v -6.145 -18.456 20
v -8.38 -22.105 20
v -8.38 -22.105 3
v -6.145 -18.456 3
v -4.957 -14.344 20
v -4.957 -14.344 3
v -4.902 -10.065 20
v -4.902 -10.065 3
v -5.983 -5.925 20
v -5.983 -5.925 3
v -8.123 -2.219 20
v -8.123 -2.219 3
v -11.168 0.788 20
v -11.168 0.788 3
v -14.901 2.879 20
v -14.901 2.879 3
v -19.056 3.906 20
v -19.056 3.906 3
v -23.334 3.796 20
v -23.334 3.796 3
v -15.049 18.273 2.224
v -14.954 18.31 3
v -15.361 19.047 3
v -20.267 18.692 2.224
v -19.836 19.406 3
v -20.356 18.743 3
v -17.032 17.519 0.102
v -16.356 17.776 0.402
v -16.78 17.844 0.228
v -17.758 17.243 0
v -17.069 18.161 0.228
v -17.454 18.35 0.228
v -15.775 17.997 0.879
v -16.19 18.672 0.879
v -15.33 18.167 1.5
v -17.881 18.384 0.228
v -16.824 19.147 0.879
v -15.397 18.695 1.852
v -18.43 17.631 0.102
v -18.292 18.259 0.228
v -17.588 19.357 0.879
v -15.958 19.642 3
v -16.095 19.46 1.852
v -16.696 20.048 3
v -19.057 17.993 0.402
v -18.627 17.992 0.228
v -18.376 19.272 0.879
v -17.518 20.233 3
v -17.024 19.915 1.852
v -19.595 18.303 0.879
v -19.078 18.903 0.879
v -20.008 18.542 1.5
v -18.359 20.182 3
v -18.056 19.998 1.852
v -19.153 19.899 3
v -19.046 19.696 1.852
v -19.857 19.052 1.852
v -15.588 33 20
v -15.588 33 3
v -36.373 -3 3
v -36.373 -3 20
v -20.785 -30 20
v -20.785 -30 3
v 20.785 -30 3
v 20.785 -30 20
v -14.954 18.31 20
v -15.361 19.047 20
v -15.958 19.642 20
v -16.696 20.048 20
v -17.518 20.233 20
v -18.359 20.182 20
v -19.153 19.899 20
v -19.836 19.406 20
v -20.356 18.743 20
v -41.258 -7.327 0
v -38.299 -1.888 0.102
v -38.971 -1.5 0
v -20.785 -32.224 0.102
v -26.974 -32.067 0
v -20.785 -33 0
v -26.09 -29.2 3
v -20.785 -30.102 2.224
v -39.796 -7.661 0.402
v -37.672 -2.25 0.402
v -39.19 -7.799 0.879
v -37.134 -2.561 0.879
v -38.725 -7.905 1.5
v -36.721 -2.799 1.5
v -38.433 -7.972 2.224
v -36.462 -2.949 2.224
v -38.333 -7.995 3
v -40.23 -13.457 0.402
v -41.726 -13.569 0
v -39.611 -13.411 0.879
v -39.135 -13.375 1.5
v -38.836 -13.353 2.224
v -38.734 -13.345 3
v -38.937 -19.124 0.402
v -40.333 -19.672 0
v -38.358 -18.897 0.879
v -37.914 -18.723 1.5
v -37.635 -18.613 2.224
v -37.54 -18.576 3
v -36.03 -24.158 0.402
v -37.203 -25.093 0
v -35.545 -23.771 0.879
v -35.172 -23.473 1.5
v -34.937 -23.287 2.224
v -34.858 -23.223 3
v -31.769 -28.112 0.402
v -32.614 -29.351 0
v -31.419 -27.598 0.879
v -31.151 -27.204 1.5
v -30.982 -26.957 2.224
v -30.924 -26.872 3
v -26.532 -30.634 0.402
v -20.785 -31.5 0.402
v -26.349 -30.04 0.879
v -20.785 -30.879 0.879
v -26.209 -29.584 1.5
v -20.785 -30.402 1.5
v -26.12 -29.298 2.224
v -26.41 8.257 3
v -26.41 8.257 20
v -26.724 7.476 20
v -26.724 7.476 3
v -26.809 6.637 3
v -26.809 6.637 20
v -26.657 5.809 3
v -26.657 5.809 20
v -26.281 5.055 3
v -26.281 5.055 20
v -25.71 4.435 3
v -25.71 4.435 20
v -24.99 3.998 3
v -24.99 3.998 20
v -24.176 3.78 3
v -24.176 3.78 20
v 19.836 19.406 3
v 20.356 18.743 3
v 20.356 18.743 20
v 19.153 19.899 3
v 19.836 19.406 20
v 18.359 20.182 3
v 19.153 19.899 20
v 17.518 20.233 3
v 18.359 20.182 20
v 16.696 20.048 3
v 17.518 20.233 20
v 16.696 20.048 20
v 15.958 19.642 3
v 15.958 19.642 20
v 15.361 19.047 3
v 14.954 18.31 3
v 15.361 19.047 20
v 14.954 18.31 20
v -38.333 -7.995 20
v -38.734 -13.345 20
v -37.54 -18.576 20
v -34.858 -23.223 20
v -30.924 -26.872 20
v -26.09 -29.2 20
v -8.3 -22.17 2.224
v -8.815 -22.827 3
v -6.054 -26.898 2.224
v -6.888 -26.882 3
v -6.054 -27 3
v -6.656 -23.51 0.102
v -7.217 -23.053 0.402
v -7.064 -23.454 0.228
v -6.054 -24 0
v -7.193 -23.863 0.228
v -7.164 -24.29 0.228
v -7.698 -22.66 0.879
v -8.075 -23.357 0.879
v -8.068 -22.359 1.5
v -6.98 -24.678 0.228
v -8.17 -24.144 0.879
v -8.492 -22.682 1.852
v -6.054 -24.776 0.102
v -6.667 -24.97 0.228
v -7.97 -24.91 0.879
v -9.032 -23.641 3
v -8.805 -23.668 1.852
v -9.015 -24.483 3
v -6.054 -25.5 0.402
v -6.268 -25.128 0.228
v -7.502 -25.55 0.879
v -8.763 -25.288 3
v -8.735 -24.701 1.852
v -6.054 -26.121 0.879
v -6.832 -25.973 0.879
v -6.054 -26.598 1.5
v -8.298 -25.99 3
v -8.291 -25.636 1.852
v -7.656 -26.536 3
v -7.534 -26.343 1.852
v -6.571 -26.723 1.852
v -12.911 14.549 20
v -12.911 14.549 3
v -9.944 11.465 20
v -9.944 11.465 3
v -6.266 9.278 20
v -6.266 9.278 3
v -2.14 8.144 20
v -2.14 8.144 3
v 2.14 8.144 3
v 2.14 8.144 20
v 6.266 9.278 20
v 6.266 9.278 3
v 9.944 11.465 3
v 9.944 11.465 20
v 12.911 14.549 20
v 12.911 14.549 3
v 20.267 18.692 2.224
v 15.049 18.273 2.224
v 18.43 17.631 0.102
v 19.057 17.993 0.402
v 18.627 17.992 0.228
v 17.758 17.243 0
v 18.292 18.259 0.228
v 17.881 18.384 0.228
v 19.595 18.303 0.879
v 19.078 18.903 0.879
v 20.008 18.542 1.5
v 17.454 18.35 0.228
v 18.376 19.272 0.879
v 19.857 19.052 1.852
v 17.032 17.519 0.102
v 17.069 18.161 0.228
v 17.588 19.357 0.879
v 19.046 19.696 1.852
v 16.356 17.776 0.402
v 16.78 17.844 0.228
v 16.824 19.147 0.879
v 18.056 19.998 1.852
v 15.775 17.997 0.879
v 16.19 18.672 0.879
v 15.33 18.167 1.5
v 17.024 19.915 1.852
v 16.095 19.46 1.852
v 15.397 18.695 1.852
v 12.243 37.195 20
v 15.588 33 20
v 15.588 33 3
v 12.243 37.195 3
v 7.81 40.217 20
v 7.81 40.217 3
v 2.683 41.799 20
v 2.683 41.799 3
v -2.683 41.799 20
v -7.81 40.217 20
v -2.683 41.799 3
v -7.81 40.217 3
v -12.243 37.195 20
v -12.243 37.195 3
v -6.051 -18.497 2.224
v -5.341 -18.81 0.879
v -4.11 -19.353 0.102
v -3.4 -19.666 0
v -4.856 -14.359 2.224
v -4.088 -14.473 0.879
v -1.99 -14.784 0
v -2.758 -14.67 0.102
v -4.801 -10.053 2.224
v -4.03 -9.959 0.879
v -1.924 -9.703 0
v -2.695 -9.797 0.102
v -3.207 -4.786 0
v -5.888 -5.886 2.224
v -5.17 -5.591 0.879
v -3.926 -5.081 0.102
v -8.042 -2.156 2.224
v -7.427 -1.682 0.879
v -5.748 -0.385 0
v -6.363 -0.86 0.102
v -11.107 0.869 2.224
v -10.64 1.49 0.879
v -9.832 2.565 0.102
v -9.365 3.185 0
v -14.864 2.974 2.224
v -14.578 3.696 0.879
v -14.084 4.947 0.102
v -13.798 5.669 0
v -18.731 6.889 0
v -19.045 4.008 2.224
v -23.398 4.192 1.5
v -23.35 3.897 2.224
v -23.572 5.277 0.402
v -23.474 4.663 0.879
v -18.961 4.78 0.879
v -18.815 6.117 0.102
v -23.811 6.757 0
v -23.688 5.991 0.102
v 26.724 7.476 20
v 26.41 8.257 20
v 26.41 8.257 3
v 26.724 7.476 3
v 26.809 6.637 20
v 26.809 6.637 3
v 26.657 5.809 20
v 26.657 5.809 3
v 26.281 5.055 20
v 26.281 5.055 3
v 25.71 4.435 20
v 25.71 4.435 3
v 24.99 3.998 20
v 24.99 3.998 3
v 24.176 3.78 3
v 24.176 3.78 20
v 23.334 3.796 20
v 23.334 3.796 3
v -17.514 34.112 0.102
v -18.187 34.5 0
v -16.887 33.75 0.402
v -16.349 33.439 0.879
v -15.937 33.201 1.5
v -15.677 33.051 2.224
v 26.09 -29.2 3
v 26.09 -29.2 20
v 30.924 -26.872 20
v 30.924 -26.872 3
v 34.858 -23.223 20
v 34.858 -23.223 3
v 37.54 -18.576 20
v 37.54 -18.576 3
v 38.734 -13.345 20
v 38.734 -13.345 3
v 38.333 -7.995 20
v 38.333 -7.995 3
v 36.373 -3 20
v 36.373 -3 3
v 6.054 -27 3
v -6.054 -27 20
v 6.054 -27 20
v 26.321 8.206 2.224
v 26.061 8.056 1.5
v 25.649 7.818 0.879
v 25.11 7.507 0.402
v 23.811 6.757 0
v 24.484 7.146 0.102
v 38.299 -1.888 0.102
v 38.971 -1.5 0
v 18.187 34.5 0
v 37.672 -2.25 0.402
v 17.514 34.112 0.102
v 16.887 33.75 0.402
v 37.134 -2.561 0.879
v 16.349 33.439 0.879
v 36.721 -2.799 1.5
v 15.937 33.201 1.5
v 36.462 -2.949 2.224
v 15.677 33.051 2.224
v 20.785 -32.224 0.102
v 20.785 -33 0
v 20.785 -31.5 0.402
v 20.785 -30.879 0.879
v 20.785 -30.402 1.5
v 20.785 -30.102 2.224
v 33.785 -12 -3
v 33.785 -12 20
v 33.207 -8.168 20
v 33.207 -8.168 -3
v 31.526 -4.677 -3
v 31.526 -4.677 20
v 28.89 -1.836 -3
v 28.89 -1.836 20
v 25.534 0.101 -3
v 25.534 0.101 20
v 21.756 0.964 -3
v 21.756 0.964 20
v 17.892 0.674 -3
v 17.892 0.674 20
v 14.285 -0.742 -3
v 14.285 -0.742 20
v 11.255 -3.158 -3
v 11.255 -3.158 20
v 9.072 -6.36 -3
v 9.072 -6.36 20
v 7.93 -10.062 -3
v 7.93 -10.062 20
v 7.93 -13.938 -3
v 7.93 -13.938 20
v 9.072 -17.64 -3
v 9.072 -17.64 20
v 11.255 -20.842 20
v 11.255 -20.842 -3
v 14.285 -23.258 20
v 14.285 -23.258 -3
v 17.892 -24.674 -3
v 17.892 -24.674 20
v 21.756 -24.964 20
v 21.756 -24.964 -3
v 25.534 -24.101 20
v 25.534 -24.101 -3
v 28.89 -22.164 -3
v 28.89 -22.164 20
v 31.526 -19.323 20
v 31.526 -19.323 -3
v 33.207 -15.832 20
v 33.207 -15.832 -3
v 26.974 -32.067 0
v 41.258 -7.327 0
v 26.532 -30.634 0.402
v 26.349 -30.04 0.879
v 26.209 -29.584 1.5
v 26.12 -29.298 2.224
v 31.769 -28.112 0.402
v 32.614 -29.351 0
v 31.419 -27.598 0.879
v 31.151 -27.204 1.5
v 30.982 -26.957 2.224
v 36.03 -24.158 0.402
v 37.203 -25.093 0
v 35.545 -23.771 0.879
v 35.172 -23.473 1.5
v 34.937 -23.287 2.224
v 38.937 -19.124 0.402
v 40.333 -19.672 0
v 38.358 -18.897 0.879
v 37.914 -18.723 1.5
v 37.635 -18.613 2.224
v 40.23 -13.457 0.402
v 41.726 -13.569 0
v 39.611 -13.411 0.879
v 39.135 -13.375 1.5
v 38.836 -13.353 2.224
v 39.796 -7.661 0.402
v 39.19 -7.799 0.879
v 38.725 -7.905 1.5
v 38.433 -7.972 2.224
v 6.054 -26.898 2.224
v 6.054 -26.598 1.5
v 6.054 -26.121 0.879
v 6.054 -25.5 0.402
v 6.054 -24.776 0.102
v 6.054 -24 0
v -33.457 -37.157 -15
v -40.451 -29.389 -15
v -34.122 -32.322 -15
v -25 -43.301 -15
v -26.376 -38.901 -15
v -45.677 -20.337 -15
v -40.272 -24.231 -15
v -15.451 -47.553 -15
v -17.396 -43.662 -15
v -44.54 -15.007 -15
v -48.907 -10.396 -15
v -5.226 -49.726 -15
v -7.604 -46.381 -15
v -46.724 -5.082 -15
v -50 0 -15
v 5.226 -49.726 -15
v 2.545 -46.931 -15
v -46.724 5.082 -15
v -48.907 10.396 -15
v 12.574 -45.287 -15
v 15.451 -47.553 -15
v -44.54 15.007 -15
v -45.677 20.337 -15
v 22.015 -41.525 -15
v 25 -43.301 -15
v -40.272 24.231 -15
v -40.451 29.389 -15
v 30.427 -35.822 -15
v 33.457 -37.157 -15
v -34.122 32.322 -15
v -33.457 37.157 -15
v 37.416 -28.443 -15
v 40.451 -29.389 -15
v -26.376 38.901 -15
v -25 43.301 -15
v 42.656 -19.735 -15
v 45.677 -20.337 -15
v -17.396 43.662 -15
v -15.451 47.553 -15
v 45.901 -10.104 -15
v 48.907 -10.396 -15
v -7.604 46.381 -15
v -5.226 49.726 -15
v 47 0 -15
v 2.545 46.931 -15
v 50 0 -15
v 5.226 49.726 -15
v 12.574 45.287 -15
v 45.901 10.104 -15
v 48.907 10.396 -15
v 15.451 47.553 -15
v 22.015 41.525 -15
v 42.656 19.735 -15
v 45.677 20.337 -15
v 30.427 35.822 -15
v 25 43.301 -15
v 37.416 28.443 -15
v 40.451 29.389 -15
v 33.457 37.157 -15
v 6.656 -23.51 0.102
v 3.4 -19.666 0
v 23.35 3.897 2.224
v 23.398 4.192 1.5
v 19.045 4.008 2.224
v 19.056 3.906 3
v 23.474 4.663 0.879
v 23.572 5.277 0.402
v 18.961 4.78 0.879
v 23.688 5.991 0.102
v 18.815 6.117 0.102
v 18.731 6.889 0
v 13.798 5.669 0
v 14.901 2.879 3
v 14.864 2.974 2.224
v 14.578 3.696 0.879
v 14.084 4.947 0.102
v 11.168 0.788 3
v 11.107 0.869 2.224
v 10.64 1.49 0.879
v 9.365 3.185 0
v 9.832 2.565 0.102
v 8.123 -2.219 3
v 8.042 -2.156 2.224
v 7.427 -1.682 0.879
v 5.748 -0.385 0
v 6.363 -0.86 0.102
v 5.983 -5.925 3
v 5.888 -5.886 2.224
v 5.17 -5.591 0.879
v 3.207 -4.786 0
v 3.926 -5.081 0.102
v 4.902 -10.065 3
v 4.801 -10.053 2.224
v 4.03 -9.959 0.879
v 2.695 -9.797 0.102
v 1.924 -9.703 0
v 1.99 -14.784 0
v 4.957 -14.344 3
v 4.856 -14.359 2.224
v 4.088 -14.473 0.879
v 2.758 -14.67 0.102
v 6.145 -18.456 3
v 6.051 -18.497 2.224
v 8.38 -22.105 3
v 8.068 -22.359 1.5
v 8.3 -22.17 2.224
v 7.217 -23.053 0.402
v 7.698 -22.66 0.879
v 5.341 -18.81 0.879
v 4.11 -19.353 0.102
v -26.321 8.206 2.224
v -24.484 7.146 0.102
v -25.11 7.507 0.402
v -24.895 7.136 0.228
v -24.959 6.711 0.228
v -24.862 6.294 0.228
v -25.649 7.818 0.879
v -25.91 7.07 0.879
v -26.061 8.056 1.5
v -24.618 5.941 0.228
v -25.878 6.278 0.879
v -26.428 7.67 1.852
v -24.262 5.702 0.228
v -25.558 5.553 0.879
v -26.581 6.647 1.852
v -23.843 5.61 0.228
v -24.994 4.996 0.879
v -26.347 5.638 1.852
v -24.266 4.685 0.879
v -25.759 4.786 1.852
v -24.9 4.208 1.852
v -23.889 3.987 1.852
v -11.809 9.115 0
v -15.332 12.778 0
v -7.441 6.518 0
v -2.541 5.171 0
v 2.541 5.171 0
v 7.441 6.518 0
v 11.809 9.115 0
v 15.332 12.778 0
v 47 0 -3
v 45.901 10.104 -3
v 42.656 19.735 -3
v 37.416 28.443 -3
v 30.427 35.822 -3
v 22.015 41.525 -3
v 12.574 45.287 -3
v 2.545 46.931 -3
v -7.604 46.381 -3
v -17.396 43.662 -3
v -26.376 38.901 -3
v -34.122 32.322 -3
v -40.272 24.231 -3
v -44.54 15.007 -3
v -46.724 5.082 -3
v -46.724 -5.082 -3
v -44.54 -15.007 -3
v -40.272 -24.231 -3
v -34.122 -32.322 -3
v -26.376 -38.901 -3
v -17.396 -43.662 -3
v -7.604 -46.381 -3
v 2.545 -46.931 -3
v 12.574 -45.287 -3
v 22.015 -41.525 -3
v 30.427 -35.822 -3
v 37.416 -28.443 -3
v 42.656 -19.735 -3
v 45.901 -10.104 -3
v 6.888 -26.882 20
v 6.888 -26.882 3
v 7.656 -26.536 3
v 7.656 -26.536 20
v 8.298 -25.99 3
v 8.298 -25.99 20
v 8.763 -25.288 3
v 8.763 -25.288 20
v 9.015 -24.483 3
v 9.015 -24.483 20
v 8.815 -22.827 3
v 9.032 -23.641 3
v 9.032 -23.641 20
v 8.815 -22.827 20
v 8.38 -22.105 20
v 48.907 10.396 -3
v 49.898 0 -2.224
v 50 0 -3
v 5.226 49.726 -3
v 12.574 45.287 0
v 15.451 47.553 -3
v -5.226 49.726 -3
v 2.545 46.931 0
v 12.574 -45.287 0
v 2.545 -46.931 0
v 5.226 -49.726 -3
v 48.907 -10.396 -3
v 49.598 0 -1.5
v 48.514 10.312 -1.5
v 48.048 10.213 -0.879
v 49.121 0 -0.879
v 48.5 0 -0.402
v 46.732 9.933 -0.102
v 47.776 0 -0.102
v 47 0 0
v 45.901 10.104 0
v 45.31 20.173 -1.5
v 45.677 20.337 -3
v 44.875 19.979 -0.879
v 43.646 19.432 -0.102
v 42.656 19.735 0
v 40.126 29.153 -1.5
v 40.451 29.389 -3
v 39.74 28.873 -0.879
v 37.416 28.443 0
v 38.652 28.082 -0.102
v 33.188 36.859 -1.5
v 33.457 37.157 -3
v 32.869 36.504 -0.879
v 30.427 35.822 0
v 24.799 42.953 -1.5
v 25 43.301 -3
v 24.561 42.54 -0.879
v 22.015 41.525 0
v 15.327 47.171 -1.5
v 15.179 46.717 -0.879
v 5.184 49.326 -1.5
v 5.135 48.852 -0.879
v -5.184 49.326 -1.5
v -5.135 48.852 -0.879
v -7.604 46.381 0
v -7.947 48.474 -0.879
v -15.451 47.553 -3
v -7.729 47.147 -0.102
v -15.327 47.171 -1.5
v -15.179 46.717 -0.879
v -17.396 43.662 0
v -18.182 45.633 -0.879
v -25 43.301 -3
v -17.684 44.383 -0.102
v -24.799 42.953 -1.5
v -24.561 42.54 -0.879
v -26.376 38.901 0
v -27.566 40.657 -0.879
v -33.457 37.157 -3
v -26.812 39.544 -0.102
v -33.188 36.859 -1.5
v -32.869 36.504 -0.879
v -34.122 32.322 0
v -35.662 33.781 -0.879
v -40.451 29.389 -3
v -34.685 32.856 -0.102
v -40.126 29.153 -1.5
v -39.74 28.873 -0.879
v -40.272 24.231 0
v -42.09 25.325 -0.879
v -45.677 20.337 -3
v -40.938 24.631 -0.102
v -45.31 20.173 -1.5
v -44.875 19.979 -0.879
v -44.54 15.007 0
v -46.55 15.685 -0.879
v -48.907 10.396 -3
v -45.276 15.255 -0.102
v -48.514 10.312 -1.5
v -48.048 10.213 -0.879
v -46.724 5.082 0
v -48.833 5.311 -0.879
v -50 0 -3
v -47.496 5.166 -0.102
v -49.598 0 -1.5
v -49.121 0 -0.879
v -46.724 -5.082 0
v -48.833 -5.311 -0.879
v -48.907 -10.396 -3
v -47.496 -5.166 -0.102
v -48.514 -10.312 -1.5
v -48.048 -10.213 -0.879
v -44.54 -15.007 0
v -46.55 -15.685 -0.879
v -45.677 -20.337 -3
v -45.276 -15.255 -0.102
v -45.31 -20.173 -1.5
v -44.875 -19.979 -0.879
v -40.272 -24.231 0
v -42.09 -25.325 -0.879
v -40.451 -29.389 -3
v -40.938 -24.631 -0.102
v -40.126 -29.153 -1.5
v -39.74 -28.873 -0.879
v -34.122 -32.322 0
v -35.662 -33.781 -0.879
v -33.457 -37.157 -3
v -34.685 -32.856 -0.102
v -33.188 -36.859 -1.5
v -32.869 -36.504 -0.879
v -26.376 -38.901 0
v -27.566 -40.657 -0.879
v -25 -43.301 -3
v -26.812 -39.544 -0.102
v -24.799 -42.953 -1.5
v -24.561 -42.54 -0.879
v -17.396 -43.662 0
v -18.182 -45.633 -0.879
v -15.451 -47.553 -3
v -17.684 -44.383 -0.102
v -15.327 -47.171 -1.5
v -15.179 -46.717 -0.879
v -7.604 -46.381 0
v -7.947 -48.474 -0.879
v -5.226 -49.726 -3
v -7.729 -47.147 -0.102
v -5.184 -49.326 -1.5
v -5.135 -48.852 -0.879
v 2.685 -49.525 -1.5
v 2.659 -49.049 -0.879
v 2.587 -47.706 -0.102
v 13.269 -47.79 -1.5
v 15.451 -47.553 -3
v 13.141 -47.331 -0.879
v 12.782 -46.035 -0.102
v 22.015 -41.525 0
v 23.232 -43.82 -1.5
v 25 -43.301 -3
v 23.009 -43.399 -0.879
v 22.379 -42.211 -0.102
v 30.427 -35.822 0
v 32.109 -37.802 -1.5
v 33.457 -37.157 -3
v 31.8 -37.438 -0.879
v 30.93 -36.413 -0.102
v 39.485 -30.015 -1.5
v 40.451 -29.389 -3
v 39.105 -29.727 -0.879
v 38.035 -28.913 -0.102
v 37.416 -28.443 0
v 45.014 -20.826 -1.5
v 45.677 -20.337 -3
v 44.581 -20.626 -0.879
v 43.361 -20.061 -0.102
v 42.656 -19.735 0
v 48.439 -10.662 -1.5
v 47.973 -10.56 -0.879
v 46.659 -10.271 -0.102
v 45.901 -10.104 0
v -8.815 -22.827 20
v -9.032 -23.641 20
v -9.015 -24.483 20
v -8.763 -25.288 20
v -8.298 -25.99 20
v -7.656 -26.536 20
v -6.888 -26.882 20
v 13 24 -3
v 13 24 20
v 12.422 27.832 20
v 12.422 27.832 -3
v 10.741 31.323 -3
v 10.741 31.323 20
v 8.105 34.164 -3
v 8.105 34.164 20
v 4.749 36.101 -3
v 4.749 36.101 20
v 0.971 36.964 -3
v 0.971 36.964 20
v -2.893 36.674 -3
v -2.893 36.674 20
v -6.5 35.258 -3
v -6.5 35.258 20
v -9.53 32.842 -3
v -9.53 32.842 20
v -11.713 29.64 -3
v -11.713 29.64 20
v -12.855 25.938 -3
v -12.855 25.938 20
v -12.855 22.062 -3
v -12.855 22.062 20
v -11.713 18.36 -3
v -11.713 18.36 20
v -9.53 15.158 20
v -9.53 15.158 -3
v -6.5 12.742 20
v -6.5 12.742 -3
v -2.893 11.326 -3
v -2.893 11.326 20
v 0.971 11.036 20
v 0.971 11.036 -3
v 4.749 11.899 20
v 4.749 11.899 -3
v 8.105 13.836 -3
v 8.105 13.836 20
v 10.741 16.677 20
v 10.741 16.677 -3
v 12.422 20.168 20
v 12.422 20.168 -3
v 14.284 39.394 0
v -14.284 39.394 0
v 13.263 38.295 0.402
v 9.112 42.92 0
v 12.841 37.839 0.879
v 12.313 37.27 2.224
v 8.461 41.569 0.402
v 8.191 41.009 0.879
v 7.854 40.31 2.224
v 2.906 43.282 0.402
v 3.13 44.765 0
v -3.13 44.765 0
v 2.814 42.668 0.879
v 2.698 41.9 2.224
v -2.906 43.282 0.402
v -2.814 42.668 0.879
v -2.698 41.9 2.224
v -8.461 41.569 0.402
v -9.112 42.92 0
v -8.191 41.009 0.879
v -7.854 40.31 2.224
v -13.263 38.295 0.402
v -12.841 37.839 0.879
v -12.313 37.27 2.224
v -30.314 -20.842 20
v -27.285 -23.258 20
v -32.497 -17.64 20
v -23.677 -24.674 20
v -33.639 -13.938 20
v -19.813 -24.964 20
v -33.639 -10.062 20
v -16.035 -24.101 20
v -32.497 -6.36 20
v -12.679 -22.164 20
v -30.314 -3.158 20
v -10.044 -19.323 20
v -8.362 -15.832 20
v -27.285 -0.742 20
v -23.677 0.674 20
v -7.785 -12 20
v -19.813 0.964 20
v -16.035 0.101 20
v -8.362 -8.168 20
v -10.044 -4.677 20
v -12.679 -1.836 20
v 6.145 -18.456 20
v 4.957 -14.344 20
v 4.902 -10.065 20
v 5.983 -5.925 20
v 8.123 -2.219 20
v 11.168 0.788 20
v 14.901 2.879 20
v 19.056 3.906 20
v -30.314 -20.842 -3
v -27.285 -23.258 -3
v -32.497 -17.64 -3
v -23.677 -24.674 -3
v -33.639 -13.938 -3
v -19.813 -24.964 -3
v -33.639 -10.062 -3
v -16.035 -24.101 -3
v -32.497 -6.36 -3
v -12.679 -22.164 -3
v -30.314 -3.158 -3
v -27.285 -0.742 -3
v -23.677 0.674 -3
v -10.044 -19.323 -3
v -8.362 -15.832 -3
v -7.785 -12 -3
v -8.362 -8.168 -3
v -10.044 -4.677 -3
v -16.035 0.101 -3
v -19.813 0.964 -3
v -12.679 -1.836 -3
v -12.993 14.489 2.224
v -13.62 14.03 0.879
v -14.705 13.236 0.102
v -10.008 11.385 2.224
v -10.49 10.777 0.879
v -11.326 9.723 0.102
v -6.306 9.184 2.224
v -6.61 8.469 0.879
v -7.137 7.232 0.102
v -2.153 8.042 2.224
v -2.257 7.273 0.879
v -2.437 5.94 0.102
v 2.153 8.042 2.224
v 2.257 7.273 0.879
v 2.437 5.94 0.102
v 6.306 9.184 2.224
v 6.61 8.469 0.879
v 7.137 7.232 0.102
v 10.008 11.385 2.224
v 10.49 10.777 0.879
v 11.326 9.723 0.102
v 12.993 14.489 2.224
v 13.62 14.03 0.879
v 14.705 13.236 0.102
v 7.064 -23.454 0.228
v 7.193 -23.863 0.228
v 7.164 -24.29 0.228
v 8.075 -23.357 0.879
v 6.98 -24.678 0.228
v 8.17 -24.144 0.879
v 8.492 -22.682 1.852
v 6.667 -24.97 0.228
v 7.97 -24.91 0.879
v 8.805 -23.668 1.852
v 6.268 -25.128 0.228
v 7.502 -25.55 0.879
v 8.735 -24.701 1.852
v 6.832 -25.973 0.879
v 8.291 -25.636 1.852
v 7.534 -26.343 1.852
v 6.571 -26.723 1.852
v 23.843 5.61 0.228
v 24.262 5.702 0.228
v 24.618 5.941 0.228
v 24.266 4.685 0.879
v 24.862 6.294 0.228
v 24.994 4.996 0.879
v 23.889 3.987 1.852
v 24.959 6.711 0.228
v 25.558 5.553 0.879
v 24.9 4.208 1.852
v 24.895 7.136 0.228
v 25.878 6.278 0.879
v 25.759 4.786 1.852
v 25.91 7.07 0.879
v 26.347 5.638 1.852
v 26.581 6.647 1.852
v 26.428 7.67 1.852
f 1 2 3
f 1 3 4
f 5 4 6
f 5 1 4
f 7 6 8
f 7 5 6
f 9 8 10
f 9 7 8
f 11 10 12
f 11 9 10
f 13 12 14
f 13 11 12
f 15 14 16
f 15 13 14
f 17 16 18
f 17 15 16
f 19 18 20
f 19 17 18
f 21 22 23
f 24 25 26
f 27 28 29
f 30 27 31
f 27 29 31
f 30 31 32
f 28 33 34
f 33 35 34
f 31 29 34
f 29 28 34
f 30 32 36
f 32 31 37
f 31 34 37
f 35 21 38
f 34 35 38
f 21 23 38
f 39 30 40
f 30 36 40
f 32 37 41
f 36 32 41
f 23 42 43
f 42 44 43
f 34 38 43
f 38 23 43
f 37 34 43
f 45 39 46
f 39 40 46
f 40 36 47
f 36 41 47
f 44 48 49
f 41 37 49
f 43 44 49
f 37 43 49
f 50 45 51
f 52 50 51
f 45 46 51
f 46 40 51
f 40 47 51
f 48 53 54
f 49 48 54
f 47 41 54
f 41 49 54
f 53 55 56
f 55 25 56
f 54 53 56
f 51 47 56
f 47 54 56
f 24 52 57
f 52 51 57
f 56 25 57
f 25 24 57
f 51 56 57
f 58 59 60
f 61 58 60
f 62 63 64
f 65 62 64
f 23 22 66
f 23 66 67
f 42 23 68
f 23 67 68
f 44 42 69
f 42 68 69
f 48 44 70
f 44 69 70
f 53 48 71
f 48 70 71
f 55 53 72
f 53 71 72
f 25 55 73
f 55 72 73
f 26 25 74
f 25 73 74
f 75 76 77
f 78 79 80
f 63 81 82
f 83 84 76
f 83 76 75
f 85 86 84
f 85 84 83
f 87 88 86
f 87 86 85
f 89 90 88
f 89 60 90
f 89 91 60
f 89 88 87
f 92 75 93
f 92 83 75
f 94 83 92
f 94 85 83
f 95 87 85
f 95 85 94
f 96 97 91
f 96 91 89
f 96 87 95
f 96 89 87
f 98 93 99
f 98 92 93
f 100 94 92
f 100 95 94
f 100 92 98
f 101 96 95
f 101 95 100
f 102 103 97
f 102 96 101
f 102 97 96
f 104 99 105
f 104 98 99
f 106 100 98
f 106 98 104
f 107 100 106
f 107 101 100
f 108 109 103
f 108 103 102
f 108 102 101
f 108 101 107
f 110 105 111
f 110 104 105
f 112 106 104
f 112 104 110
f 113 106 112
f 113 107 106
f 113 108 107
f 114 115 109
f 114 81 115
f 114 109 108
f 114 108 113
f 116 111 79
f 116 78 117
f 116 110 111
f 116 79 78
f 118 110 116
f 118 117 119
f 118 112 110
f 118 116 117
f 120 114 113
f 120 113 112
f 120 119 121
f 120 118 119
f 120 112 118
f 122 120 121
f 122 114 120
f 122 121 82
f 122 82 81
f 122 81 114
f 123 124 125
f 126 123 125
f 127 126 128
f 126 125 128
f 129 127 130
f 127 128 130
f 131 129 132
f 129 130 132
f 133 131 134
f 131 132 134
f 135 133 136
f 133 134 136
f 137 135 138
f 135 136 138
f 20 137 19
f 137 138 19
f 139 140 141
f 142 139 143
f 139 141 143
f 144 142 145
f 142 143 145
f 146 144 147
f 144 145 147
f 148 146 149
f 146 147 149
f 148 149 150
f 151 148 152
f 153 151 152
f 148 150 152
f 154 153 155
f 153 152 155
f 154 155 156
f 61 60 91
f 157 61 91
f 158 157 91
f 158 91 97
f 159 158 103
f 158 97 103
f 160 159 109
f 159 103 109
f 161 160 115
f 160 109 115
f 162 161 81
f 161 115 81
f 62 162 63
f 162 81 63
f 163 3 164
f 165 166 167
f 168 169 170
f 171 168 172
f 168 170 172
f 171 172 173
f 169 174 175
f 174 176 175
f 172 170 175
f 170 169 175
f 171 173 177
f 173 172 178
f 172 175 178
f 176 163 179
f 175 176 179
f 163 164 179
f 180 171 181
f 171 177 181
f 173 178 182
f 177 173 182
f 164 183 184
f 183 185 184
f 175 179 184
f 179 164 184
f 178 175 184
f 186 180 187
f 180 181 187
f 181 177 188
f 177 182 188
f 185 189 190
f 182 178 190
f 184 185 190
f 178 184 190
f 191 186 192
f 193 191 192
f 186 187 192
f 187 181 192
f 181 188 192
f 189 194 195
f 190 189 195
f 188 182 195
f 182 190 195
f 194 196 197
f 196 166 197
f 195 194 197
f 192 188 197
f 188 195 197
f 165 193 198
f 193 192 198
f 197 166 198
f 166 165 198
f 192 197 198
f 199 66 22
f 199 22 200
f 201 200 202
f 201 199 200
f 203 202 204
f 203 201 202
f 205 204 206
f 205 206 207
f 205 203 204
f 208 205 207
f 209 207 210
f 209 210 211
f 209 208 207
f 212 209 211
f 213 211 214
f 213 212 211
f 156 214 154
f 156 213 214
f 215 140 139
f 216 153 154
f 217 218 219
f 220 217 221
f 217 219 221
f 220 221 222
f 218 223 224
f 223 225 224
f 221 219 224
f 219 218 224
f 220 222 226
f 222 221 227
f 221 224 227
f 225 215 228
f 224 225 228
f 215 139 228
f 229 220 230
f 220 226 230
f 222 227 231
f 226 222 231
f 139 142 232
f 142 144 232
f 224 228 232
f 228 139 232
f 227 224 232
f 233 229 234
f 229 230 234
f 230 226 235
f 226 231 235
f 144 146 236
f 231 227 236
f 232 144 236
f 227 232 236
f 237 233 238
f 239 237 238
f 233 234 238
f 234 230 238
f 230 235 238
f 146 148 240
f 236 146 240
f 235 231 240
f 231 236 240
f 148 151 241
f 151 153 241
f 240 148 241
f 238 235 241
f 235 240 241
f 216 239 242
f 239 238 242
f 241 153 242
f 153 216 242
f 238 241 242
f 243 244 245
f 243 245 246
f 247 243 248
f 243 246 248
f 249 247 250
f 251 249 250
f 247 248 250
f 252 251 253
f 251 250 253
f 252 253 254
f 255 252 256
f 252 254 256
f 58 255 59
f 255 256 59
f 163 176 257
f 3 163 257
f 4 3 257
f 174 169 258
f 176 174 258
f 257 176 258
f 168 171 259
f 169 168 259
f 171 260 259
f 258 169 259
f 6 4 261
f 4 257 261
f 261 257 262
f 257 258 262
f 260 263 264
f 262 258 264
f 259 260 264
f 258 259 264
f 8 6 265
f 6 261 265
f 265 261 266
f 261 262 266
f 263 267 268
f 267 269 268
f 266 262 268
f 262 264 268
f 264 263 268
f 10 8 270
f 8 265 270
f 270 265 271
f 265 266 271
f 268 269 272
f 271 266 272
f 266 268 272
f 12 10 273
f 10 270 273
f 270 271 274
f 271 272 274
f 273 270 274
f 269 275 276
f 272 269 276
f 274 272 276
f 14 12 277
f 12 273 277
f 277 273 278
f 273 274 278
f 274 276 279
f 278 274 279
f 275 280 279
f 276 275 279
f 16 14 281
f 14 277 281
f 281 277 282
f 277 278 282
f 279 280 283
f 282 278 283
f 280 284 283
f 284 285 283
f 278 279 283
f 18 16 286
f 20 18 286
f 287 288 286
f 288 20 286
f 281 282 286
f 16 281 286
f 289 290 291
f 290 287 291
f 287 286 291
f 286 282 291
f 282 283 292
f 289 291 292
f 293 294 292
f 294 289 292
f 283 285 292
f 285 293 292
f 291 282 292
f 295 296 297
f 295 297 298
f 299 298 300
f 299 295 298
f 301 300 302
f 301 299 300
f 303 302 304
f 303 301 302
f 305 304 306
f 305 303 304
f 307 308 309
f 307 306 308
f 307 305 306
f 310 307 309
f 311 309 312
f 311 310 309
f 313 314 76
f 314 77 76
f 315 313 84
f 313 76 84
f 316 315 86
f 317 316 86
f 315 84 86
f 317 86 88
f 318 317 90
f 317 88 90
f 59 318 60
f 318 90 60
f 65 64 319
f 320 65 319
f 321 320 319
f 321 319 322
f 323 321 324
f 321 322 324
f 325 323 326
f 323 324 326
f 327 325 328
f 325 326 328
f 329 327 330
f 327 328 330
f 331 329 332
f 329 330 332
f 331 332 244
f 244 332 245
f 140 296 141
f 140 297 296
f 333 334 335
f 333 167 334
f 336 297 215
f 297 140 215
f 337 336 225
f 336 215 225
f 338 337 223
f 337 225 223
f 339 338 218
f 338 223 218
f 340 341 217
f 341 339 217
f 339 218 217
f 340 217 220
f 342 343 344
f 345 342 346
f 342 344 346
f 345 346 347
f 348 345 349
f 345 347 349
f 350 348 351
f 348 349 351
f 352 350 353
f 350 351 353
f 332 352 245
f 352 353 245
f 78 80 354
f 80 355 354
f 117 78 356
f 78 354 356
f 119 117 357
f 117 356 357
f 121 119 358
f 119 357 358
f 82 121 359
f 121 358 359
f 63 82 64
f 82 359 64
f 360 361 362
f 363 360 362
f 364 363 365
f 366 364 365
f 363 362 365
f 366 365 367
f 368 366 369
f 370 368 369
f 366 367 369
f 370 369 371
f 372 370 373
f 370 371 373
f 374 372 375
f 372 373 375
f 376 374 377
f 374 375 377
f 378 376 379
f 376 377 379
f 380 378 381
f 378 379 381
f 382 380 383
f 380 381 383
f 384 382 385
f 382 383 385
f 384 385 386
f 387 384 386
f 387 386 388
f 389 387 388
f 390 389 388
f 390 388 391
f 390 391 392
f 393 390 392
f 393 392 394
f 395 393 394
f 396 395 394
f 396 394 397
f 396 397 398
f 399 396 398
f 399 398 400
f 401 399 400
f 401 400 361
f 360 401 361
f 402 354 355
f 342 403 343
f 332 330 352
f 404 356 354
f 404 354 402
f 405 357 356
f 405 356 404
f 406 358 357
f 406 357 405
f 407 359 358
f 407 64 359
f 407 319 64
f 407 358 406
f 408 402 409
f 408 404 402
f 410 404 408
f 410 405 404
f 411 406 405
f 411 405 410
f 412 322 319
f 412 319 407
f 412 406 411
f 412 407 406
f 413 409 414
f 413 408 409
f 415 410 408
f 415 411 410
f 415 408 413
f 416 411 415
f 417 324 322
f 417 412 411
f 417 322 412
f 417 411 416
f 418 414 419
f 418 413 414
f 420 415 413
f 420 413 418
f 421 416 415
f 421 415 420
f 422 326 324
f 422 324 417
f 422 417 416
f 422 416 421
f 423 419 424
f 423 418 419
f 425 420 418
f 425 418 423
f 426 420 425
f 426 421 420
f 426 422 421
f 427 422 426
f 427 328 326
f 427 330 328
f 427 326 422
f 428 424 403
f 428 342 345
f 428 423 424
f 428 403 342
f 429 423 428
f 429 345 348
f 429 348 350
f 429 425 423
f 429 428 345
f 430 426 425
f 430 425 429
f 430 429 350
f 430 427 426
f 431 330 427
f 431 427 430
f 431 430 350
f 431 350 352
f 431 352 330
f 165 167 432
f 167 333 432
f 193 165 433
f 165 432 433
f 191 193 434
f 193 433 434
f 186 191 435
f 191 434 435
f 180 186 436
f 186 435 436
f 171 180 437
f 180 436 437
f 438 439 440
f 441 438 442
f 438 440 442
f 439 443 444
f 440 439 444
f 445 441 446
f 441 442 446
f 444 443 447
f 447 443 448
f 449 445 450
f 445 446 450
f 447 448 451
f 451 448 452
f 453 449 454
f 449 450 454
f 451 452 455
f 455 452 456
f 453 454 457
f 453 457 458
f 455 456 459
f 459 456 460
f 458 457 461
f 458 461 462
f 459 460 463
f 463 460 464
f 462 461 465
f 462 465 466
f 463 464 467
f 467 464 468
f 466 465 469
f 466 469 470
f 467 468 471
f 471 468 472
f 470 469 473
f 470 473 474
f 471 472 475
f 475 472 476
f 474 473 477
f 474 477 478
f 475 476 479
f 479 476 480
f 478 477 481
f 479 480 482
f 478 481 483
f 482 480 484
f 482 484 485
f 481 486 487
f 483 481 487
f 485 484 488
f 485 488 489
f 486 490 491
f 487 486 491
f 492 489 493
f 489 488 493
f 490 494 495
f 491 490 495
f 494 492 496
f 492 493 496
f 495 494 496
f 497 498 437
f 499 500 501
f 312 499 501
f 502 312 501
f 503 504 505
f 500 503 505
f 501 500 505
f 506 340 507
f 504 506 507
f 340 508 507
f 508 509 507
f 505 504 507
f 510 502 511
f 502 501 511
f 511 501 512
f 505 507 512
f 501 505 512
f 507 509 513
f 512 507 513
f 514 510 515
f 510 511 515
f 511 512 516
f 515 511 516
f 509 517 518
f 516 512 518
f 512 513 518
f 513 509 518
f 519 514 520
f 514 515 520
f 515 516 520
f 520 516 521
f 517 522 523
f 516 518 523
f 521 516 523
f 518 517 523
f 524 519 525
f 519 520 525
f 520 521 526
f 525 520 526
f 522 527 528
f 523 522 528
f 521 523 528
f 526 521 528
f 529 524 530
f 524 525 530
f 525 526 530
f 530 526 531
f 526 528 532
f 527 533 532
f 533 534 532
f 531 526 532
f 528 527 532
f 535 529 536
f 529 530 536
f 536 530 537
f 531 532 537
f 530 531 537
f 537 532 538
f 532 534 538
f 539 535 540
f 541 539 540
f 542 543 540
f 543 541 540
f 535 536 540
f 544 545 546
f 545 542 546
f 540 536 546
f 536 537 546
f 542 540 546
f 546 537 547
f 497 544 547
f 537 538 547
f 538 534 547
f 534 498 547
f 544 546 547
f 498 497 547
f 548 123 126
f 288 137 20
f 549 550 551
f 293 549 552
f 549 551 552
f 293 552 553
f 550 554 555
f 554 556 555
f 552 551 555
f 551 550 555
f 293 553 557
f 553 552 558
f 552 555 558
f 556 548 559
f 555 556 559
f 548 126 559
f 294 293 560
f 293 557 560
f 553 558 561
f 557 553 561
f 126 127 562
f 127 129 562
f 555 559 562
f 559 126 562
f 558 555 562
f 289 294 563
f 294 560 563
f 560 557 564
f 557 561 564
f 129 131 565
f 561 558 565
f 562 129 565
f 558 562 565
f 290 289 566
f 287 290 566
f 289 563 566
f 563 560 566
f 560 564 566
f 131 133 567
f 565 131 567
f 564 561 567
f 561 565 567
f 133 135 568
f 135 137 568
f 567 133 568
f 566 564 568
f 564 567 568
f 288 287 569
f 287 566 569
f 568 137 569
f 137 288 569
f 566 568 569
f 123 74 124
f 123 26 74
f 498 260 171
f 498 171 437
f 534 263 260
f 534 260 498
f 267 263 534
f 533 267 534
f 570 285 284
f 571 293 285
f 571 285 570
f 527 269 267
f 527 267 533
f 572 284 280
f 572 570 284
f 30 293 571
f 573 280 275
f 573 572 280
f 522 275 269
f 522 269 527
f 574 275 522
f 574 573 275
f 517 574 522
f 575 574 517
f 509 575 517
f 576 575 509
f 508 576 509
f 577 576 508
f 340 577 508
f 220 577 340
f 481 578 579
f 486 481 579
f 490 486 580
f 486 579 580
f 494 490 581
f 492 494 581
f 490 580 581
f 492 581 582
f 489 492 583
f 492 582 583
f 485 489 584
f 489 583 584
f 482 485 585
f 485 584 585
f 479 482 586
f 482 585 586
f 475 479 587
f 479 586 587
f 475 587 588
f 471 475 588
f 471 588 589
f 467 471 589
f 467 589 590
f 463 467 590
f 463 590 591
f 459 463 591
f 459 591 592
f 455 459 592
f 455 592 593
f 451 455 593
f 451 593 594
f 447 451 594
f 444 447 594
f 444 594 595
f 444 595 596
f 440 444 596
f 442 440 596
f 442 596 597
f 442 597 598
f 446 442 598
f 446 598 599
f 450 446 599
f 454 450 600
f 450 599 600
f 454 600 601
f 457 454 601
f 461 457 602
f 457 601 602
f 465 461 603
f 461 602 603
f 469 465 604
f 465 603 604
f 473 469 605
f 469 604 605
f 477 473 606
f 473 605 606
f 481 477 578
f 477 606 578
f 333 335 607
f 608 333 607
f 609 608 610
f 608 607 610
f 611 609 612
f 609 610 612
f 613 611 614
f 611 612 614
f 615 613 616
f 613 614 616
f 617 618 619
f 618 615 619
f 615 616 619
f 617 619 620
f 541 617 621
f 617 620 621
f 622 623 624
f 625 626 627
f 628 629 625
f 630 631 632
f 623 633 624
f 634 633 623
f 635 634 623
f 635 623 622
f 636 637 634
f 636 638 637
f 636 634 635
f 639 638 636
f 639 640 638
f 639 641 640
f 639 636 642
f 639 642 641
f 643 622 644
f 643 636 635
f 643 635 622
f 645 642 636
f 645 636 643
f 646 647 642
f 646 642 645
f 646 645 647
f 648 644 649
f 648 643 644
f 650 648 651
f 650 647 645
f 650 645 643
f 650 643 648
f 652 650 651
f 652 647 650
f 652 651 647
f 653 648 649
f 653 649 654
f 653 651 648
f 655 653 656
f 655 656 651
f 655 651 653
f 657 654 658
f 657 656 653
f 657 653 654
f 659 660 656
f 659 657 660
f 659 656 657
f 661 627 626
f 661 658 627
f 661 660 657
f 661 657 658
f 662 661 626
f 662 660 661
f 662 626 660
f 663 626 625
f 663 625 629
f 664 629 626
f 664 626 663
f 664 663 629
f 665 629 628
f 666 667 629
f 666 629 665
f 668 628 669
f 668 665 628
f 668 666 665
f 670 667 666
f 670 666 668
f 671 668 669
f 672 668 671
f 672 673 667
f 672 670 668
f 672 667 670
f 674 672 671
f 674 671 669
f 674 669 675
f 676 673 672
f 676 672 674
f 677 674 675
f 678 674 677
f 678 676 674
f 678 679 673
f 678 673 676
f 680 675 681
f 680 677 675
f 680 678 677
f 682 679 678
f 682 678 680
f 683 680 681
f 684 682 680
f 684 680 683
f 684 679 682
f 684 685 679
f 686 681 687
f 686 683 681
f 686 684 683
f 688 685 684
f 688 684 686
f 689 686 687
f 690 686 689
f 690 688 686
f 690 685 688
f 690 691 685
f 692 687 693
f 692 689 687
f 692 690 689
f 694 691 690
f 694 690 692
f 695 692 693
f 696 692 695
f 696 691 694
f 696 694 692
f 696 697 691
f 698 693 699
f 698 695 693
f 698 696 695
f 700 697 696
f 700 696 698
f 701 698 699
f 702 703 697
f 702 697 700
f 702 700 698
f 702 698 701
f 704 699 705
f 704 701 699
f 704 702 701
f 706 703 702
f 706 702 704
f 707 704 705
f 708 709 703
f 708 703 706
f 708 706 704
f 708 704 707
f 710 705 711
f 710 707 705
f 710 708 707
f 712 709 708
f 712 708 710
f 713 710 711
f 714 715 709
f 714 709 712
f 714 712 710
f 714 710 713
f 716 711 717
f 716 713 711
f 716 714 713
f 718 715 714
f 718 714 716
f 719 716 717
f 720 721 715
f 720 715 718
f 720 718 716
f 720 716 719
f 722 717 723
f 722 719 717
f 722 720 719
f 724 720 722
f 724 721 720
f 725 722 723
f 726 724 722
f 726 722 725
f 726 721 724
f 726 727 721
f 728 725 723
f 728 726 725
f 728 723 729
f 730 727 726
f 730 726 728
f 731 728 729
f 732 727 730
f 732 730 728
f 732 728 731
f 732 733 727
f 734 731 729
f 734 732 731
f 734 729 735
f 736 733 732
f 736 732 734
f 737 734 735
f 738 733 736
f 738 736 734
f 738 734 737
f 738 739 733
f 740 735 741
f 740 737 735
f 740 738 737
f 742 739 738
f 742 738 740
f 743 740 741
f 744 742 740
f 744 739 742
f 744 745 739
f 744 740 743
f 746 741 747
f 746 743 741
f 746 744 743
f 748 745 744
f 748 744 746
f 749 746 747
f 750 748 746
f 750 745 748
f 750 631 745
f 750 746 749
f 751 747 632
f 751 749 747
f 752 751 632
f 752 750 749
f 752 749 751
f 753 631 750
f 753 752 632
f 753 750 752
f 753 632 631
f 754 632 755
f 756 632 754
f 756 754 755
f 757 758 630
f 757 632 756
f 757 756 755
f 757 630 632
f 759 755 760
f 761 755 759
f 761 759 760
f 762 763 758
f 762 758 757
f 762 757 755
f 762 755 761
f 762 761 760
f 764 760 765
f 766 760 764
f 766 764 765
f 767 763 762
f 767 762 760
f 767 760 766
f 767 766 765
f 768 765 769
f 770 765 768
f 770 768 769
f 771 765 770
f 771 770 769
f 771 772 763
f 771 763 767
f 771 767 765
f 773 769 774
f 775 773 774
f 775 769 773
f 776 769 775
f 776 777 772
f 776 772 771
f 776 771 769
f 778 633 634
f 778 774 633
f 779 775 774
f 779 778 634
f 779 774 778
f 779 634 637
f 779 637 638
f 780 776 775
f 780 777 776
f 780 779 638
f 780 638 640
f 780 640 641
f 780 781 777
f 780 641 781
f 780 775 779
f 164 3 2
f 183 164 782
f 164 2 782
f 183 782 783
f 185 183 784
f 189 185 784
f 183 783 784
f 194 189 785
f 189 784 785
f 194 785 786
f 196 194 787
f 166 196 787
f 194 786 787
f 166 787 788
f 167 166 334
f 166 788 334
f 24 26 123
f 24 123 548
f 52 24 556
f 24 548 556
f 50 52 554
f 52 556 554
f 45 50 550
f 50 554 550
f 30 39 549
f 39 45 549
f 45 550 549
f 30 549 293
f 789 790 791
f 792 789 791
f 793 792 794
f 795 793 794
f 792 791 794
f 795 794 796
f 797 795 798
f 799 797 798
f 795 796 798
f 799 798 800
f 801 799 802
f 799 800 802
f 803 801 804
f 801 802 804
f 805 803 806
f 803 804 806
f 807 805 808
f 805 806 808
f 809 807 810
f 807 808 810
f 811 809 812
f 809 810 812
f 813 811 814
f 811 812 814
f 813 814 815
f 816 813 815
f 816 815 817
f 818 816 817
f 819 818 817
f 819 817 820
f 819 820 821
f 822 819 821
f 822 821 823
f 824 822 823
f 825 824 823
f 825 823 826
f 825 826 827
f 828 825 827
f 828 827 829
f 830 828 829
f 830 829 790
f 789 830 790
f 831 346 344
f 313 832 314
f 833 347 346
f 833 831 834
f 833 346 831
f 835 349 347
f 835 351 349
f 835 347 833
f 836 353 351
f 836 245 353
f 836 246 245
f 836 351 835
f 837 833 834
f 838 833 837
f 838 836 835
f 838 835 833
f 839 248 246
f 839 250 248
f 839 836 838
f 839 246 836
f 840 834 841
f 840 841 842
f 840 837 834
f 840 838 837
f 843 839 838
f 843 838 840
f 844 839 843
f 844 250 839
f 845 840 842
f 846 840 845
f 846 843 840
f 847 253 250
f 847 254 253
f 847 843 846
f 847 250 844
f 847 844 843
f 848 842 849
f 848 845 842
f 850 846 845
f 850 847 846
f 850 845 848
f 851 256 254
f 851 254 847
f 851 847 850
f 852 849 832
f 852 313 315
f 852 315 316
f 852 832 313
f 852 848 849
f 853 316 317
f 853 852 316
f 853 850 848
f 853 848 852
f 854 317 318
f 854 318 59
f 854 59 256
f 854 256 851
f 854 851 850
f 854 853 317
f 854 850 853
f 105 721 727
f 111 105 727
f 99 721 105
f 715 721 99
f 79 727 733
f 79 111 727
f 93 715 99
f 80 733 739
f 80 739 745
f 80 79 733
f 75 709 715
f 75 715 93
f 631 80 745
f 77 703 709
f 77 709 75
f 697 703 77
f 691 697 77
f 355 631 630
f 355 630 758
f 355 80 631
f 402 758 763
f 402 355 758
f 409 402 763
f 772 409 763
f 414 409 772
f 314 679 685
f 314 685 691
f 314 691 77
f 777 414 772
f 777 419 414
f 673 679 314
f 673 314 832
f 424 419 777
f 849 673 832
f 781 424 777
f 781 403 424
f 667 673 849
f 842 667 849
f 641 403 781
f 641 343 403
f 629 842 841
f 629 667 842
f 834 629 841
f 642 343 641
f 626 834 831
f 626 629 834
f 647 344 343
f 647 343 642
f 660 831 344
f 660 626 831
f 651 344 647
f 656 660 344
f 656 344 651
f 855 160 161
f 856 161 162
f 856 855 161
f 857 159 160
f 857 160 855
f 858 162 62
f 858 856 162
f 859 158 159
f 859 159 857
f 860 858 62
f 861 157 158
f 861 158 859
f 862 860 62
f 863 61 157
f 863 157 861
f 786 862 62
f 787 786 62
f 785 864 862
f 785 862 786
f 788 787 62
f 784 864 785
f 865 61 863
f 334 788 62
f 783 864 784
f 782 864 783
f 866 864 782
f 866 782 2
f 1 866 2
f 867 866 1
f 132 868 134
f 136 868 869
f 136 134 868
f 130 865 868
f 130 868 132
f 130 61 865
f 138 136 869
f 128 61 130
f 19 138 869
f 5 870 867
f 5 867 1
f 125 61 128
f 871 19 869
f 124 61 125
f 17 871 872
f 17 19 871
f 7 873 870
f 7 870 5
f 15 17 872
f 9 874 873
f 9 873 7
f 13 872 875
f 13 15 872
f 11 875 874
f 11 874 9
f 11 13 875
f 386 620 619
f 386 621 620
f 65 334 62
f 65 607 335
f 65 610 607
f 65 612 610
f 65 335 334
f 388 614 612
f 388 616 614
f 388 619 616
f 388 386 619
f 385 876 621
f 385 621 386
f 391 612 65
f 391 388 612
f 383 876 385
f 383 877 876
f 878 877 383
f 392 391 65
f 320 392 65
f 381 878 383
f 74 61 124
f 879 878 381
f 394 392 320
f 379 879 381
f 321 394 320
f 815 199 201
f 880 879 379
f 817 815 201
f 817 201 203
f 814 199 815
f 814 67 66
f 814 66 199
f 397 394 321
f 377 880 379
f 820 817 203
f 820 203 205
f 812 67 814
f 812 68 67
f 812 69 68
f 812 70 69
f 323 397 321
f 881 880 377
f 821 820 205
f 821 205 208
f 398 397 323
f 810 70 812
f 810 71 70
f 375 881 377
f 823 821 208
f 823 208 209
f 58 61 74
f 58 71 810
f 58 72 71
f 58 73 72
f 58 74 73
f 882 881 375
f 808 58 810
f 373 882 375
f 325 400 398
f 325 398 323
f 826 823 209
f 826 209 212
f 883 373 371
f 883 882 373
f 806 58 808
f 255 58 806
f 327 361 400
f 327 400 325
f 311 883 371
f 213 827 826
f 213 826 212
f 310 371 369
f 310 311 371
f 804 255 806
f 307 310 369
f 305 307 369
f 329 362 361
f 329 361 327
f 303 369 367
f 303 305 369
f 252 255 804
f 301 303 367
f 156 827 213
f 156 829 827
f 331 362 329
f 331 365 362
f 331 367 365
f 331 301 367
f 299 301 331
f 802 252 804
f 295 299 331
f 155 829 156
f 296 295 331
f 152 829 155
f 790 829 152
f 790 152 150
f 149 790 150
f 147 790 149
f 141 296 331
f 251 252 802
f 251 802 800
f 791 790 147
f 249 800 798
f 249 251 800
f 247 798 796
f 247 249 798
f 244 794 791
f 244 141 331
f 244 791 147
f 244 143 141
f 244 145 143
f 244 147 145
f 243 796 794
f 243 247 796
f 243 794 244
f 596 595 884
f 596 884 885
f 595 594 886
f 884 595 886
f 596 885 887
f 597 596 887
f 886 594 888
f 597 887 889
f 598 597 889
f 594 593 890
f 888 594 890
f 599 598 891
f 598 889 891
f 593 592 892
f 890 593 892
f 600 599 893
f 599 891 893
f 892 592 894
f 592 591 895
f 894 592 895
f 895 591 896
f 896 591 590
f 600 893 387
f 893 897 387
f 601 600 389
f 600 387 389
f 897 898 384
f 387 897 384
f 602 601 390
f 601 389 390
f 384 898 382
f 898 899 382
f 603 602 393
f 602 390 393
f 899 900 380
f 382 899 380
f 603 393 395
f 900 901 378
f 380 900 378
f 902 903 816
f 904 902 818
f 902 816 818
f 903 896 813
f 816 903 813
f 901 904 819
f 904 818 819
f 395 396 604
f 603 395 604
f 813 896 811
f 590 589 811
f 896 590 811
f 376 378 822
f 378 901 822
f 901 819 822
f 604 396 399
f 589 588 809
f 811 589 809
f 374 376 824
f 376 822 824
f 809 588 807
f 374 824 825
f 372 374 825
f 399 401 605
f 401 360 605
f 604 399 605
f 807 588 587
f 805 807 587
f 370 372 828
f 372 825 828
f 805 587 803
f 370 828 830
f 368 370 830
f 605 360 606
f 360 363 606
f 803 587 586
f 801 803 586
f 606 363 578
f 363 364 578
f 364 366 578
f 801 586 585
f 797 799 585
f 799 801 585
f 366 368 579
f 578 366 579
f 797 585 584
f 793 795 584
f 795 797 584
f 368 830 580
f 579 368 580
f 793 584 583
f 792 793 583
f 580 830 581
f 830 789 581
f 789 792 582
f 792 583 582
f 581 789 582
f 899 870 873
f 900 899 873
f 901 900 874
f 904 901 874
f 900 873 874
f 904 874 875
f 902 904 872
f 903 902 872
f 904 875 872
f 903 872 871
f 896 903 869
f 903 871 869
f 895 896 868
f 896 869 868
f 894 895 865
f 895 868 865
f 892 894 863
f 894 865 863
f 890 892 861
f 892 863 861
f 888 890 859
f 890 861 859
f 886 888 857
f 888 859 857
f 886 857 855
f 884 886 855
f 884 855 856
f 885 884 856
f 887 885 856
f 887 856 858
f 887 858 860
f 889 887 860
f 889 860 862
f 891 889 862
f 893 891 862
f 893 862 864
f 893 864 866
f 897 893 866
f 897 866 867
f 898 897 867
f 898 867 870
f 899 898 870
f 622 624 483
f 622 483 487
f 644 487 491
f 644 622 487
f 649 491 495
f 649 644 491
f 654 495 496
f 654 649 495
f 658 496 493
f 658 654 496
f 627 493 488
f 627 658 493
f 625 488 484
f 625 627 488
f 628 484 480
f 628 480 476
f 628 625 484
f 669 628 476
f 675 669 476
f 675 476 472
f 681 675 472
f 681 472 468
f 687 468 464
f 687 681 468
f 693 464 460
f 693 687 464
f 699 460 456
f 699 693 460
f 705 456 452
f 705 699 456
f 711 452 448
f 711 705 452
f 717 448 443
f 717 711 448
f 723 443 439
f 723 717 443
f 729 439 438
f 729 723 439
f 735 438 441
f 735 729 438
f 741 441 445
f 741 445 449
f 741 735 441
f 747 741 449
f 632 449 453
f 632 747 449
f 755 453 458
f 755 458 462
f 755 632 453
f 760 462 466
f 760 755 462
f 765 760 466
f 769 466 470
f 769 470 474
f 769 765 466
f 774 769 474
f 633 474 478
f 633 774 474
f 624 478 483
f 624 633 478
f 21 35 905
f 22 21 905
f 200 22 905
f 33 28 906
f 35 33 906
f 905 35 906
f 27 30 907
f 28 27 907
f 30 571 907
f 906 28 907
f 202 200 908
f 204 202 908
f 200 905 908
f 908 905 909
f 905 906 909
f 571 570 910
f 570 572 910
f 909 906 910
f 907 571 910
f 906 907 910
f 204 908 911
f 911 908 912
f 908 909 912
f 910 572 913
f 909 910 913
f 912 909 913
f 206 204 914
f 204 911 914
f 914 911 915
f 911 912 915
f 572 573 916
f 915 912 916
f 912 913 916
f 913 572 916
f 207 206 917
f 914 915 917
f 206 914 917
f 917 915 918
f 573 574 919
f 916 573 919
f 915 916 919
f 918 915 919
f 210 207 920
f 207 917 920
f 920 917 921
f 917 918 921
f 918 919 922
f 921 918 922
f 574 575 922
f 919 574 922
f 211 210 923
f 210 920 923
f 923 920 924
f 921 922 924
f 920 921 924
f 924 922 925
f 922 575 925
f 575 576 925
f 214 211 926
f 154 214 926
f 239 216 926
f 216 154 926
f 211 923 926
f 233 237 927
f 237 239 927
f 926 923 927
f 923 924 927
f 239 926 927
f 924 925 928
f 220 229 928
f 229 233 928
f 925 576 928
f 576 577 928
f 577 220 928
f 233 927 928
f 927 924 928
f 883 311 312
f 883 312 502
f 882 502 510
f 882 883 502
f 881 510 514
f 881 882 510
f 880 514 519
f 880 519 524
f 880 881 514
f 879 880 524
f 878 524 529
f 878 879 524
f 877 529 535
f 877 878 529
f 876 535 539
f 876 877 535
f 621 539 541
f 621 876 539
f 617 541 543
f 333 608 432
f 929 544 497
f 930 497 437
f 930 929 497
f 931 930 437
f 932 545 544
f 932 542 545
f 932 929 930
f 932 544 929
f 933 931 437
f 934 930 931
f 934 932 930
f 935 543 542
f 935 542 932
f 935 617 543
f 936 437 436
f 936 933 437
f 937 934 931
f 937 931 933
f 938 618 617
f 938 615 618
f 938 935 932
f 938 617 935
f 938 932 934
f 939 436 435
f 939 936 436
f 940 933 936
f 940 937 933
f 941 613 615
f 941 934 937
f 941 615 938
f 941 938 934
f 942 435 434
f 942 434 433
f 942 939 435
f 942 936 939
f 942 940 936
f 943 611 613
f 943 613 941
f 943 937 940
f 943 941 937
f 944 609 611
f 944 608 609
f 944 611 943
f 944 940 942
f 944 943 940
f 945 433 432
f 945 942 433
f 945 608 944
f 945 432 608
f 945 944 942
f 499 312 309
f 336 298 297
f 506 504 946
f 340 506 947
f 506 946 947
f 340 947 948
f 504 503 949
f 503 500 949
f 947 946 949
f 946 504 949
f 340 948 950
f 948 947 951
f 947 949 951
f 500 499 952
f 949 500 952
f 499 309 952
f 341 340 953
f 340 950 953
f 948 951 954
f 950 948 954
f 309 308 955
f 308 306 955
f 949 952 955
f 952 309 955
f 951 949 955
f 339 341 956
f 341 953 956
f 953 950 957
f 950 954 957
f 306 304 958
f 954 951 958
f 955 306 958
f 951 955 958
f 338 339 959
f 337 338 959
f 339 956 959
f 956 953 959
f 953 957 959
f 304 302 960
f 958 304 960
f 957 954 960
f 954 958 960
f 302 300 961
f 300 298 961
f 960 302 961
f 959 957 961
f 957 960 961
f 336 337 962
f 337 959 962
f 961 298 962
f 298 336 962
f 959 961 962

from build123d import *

# Parameters (mm, degrees)
F0_R         = 50
F1_DEPTH     = 15
F2_T         = -3
F4_DEPTH     = 20
F5_R         = 13
F6_DEPTH     = 35.001
F7_T         = 3
F7_T3_DEPTH  = 47.5692193817
F7_T5_DEPTH  = 47.5692193817
F7_T7_DEPTH  = 47.5692193817
F7_T10_ANGLE = 120.000000001
F7_T12_ANGLE = 120.000000001
F7_T14_ANGLE = 120.000000001
F8_R         = 3


# Not quite as in the source:
# - a shell that OpenCascade refuses in one call is made with other operations: the cavity is built on its own and cut out


with BuildPart() as f1:
    # F0 (on Top) → F1 (new body)
    with BuildSketch(Plane.XY):
        Circle(F0_R)
    extrude(amount=-F1_DEPTH)

    # F2
    f2_openings = [f1.faces().sort_by_distance(p)[0] for p in [
        (0, 0, -15),
    ]]
    offset(amount=F2_T, openings=f2_openings)

    # F3 (on face) → F4 (join)
    with BuildSketch(Plane.XY):
        with BuildLine():
            Line((36.3730669589, -3), (15.5884572681, 33))
            ThreePointArc((15.5884572681, 33), (0, 42), (-15.5884572681, 33))
            Line((-15.5884572681, 33), (-36.3730669589, -3))
            ThreePointArc((-36.3730669589, -3), (-36.3730669589, -21), (-20.7846096908, -30))
            Line((-20.7846096908, -30), (20.7846096908, -30))
            ThreePointArc((20.7846096908, -30), (36.3730669589, -21), (36.3730669589, -3))
        make_face()
    extrude(amount=F4_DEPTH)

    # F5 (on face) → F6 (cut, through all)
    with BuildSketch(Plane.XY.offset(20)):
        with Locations((0, 24)):
            Circle(F5_R)
        with Locations((-20.7846096908, -12)):
            Circle(F5_R)
        with Locations((20.7846096908, -12)):
            Circle(F5_R)
    extrude(amount=-F6_DEPTH, mode=Mode.SUBTRACT)

    # F7: shell of thickness 3, made by hand


with BuildPart() as f7_core1:
    # F7_t2: copy of F1
    add(f1.part)

    # the walls: a layer under each face that stays
    f7_faces = [f7_core1.faces().sort_by_distance(p)[0] for p in [
        (-50, 0, -7.5),
        (-33.3333333333, -33.3333333333, 0),
        (-33.3333333333, -33.3333333333, -15),
        (25.9807621135, 15, 10),
        (0, 42, 10),
        (-25.9807621135, 15, 10),
        (-36.3730669589, -21, 10),
        (0, -30, 10),
        (36.3730669589, -21, 10),
        (-47, 0, -9),
        (0, 0, -3),
        (-33.7846096908, -12, 8.5),
        (7.7846096908, -12, 8.5),
        (-13, 24, 8.5),
    ]]
    thicken(f7_faces, amount=-F7_T, mode=Mode.SUBTRACT)

    # F7_s4 → F7_t3 (cut)
    with BuildSketch(Plane(origin=(11.8923048454, -20.5980762114, 0), x_dir=(0, 0, 1), z_dir=(-0.5, 0.8660254038, 0))):
        Polygon((0.03, 30.03), (-3, 30), (-3, 27), (0, 27), align=None)
    extrude(amount=F7_T3_DEPTH, mode=Mode.SUBTRACT)

    # F7_s6 → F7_t5 (cut)
    with BuildSketch(Plane(origin=(11.8923048454, 20.5980762114, 0), x_dir=(0, 0, 1), z_dir=(-0.5, -0.8660254038, 0))):
        Polygon((0.03, 30.03), (-3, 30), (-3, 27), (0, 27), align=None)
    extrude(amount=F7_T5_DEPTH, mode=Mode.SUBTRACT)

    # F7_s8 → F7_t7 (cut)
    with BuildSketch(Plane.YZ.offset(-23.7846096908)):
        Polygon((-30.03, 0.03), (-30, -3), (-27, -3), (-27, 0), align=None)
    extrude(amount=F7_T7_DEPTH, mode=Mode.SUBTRACT)

    # F7_s9 → F7_t10 (revolve, cut)
    with BuildSketch(Plane(origin=(-10.3923048454, 18, 0), x_dir=(0, 0, 1), z_dir=(0.5, -0.8660254038, 0))):
        Polygon((0.03, -30.03), (-3, -30), (-3, -27), (0, -27), align=None)
    revolve(axis=Axis((0, 24, 0), (0, 0, 1)), revolution_arc=F7_T10_ANGLE, mode=Mode.SUBTRACT)

    # F7_s11 → F7_t12 (revolve, cut)
    with BuildSketch(Plane(origin=(-10.3923048454, -18, 0), x_dir=(0, 0, 1), z_dir=(0.5, 0.8660254038, 0))):
        Polygon((0.03, -30.03), (-3, -30), (-3, -27), (0, -27), align=None)
    revolve(axis=Axis((-20.7846096908, -12, 0), (0, 0, 1)), revolution_arc=F7_T12_ANGLE, mode=Mode.SUBTRACT)

    # F7_s13 → F7_t14 (revolve, cut)
    with BuildSketch(Plane.YZ.offset(20.7846096908)):
        Polygon((-30.03, 0.03), (-30, -3), (-27, -3), (-27, 0), align=None)
    revolve(axis=Axis((20.7846096908, -12, 0), (0, 0, 1)), revolution_arc=F7_T14_ANGLE, mode=Mode.SUBTRACT)

    # F7_s15 → F7_t16 (revolve, cut)
    with BuildSketch(Plane.XZ):
        Polygon((46.97, -3.03), (50, -3), (50, 0), (47, 0), align=None)
    revolve(axis=Axis((0, 0, -3), (0, 0, 1)), mode=Mode.SUBTRACT)


with BuildPart() as f1_1:
    add(f1.part)

    # what is left inside the walls is the cavity
    f7_cavity = [f7_core1.part.solids().sort_by_distance(p)[0] for p in [
        (6.902222, -3.985, 6.666667),
    ]]
    add(f7_cavity, mode=Mode.SUBTRACT)

    # F8
    f8_edges = [f1_1.edges().sort_by_distance(p)[0] for p in [
        (6.928203, -4, 0),
        (23.382686, 13.5, 0),
        (0, 8, 0),
        (-23.382686, 13.5, 0),
        (-6.928203, -4, 0),
        (0, -27, 0),
        (-25.980762, 15, 0),
        (-50, 0, 0),
        (25.980762, 15, 0),
        (0, 42, 0),
        (-36.373067, -21, 0),
        (0, -30, 0),
        (36.373067, -21, 0),
        (15.774263, 26.678175, 10),
        (30.991109, 0.321825, 10),
        (-15.774263, 26.678175, 10),
        (-30.991109, 0.321825, 10),
        (-15.216845, -27, 10),
        (15.216845, -27, 10),
    ]]
    fillet(f8_edges, radius=F8_R)


solid = f1_1.part
